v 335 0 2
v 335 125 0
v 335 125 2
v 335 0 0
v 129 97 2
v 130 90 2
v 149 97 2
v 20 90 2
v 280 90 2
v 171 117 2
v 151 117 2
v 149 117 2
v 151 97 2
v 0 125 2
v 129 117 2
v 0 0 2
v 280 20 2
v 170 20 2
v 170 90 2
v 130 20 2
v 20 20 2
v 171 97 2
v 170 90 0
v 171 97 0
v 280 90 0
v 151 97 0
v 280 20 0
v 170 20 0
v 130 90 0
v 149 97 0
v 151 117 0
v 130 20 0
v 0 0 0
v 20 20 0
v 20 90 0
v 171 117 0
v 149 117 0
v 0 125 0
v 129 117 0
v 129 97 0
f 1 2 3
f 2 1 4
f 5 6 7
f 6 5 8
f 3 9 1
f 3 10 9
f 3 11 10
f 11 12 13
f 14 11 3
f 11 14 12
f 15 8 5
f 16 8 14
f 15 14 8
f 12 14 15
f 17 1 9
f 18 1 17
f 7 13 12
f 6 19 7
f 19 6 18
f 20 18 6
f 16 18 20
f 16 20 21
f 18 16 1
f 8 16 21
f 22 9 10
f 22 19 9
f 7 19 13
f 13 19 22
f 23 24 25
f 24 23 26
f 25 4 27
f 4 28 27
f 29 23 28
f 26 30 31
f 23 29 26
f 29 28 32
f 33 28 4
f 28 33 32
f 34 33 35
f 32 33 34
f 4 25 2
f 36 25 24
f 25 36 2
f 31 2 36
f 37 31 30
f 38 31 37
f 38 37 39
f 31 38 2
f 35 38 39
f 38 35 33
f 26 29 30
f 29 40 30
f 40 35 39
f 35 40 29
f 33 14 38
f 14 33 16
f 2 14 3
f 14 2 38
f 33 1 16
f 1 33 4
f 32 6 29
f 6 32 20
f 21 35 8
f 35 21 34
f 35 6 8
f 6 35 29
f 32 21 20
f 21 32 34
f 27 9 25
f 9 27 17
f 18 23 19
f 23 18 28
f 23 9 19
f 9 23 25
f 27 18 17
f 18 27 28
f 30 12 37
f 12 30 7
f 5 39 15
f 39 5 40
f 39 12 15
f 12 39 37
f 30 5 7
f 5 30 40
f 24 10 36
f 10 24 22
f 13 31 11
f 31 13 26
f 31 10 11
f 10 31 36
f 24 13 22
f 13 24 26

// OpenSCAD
$fn = 100;

difference() {
    cube([335, 125, 2]);
    translate([20, 20, -1])
    cube([110, 70, 4]);
    translate([170, 20, -1])
    cube([110, 70, 4]);

    translate([129, 20+70+7, -1])
    cube([20, 20, 4]);
    translate([151, 20+70+7, -1])
    cube([20, 20, 4]);
}
